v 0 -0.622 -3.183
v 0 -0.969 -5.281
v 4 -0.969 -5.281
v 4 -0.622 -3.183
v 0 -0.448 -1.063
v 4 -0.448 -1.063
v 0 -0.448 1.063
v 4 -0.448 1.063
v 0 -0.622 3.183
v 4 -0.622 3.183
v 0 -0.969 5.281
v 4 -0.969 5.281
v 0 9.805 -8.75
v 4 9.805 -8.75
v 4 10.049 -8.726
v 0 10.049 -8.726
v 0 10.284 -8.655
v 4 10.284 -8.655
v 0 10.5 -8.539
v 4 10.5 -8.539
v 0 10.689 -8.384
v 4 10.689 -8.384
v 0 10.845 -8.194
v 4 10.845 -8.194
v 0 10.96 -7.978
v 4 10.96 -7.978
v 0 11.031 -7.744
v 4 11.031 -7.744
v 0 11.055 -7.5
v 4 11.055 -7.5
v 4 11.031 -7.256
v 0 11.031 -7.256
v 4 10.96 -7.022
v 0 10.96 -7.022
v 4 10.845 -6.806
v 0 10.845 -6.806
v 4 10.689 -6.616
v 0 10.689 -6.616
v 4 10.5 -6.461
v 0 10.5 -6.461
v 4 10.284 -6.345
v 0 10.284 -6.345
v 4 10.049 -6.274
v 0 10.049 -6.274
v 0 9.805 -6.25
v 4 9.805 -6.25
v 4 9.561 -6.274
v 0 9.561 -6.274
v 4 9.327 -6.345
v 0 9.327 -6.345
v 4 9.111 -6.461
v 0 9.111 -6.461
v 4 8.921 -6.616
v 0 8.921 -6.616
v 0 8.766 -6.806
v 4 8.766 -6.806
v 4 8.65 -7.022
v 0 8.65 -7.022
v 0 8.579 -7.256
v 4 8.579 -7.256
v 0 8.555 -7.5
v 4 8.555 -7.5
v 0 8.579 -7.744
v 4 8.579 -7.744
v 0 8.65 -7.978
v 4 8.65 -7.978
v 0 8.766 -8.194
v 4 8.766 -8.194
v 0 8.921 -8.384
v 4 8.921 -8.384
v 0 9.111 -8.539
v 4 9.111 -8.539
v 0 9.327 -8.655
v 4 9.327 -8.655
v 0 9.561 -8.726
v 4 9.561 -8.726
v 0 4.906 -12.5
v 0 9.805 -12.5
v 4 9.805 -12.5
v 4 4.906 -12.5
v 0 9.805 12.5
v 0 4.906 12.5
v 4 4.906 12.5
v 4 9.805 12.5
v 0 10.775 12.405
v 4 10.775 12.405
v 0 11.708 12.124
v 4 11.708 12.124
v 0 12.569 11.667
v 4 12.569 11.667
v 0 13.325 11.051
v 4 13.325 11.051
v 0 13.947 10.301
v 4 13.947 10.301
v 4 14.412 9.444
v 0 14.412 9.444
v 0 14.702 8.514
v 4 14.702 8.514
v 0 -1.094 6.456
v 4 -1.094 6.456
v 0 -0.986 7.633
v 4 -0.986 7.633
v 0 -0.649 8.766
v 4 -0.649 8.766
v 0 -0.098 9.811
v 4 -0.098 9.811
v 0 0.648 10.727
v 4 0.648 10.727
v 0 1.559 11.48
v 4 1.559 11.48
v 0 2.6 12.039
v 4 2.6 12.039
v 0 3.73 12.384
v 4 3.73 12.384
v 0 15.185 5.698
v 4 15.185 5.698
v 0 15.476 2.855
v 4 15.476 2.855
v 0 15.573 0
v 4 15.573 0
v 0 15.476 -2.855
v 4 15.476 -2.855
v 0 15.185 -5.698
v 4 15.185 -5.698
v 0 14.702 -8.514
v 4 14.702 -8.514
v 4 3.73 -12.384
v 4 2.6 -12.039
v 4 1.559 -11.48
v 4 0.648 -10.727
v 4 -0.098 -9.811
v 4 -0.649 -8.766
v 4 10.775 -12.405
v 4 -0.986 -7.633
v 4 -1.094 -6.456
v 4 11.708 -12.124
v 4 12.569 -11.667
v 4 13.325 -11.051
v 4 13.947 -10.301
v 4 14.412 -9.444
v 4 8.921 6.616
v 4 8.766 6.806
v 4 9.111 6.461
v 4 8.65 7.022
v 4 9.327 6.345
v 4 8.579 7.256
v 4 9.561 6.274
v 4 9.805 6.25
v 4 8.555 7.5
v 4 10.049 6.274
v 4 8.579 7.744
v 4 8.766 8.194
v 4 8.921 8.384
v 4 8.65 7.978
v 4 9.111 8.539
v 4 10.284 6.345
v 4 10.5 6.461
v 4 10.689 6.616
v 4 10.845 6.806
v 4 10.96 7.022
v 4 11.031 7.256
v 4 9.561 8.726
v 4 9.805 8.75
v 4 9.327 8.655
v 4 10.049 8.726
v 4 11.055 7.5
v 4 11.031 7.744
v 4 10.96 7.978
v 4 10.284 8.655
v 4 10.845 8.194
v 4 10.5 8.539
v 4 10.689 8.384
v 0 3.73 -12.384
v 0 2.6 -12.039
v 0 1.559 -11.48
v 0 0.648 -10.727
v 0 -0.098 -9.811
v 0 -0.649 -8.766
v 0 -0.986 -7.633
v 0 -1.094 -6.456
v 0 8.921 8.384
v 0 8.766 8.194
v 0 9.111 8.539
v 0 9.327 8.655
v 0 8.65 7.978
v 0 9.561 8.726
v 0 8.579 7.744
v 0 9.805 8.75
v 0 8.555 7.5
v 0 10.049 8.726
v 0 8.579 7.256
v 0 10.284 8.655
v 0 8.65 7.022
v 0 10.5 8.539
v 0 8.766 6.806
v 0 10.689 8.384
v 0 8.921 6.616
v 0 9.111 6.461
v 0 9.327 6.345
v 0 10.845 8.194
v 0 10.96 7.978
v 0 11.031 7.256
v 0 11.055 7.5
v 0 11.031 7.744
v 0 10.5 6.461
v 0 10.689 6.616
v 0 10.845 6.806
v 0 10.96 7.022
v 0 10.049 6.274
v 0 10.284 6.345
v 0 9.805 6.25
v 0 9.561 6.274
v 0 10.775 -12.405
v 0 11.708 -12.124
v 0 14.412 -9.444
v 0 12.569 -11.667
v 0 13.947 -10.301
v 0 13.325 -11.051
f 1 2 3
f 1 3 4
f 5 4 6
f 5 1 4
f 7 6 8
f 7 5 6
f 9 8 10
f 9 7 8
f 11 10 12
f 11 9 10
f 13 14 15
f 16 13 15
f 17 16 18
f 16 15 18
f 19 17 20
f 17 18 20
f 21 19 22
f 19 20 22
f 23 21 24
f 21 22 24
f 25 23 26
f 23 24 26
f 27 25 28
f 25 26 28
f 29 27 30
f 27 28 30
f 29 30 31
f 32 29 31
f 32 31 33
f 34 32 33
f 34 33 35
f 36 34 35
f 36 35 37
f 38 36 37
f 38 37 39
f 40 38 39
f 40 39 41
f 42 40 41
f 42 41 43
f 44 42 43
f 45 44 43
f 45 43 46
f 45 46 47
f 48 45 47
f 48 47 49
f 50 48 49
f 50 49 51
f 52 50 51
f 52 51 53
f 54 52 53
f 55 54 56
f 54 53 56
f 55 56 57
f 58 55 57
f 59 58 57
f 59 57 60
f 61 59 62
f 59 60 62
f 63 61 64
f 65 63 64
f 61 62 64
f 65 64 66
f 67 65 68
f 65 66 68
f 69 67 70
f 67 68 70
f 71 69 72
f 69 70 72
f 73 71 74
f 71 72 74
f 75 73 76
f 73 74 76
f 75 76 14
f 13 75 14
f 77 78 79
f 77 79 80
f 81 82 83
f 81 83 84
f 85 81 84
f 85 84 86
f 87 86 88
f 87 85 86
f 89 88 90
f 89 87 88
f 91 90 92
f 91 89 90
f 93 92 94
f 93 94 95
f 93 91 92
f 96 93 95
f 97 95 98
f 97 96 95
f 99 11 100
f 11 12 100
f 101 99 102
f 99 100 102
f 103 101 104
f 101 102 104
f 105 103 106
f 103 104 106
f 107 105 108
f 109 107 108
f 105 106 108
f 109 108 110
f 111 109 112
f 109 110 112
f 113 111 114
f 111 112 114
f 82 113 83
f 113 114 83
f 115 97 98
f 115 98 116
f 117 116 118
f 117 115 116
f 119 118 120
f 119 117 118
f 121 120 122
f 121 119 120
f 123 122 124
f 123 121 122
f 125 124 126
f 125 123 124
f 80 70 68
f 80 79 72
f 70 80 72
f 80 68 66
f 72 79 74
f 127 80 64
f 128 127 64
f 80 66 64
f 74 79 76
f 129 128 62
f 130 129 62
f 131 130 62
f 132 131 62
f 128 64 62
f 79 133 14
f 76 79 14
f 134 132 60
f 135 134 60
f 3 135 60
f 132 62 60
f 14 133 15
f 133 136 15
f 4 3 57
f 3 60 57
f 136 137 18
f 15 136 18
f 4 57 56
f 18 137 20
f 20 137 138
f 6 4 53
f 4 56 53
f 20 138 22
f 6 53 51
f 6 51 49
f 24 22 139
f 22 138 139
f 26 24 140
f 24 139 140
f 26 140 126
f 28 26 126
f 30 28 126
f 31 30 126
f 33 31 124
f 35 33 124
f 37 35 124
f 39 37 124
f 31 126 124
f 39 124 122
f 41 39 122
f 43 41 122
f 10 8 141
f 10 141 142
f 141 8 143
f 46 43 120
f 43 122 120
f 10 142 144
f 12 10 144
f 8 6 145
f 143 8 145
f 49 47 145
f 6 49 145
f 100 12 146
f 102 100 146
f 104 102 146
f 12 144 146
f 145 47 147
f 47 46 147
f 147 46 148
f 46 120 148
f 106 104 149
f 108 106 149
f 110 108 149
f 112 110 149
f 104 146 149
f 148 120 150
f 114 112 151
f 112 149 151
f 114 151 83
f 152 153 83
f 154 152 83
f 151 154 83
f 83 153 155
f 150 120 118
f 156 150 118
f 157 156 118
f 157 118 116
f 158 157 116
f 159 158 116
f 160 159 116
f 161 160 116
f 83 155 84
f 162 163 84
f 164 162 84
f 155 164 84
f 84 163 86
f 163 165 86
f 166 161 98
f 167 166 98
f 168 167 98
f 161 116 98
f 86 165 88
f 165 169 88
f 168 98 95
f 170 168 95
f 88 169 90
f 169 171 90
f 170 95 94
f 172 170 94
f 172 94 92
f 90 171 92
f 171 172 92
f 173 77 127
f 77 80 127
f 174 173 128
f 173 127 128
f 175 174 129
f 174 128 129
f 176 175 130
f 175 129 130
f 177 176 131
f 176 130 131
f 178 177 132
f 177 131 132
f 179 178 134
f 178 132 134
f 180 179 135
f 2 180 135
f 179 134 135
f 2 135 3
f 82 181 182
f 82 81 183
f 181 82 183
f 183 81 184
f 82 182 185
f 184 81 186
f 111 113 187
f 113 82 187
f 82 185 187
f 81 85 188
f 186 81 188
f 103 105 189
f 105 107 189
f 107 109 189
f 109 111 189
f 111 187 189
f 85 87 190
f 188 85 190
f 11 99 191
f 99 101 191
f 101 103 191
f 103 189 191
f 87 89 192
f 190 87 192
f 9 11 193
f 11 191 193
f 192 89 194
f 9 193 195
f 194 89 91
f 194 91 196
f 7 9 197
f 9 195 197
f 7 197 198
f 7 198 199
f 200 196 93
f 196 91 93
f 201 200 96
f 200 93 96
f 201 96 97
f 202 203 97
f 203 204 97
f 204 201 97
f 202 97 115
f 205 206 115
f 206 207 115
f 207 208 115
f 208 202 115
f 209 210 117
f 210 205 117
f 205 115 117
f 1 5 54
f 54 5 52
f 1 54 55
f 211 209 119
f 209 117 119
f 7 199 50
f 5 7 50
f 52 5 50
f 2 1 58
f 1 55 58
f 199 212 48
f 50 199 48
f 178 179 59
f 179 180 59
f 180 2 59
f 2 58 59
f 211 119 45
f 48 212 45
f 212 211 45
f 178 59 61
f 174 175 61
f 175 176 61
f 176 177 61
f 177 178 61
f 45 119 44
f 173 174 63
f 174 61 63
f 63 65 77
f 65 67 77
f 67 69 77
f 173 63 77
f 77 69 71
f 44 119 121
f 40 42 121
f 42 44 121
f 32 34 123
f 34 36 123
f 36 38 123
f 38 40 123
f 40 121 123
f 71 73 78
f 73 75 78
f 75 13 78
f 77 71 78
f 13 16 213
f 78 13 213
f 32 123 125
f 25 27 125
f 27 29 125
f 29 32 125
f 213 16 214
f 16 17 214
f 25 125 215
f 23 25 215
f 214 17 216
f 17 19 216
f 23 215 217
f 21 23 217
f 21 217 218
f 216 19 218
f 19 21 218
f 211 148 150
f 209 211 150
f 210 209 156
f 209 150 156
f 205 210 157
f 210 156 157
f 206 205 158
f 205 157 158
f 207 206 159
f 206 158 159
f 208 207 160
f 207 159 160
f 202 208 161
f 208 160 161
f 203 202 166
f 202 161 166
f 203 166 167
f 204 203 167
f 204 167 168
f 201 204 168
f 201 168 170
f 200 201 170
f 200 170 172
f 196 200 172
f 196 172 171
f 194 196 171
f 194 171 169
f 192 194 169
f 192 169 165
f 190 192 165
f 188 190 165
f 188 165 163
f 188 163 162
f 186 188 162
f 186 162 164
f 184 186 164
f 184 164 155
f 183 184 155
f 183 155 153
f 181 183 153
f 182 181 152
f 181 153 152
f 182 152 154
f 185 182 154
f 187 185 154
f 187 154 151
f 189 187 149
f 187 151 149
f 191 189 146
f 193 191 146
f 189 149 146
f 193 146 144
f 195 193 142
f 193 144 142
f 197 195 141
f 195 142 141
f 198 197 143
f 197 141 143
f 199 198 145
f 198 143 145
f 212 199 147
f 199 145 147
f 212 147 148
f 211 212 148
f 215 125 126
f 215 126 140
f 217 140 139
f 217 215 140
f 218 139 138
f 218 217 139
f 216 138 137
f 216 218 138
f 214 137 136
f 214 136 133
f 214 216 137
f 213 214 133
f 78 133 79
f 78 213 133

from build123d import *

# Parameters (mm, degrees)
SKETCH2_R             = 3
BOSS_EXTRUDE1_DEPTH   = 4
FILLET1_R             = 6
M3X0_5_TAPPED_HOLE1_D = 2.5


with BuildPart() as part:
    # Sketch2 → Boss-Extrude1 (new body)
    # profile 1 of 2: a face of its own
    with BuildSketch(Plane(origin=(0, 0, 0), x_dir=(0, 0, -1), z_dir=(1, 0, 0))):
        with BuildLine():
            Line((12.5, 9.80532533), (12.5, -3.628540469))
            ThreePointArc((12.5, -3.628540469), (0, -0.426566699), (-12.5, -3.628540469))
            Line((-12.5, -3.628540469), (-12.5, 9.80532533))
            ThreePointArc((-12.5, 9.80532533), (-11.377342361, 12.962256786), (-8.513513514, 14.701526956))
            ThreePointArc((-8.513513514, 14.701526956), (0, 15.573433301), (8.513513514, 14.701526956))
            ThreePointArc((8.513513514, 14.701526956), (11.377342361, 12.962256786), (12.5, 9.80532533))
        make_face()
        with Locations((0, 10.573433301)):
            Circle(SKETCH2_R, mode=Mode.SUBTRACT)
    # profile 2 of 2: a face of its own
    with BuildSketch(Plane(origin=(0, 0, 0), x_dir=(0, 0, -1), z_dir=(1, 0, 0))):
        with Locations((0, 10.573433301)):
            Circle(SKETCH2_R)
    extrude(amount=BOSS_EXTRUDE1_DEPTH)

    # Fillet1
    fillet1_edges = [part.edges().sort_by_distance(p)[0] for p in [
        (2, -3.628540469, -12.5),
        (2, -3.628540469, 12.5),
    ]]
    fillet(fillet1_edges, radius=FILLET1_R)

    # M3x0.5 Tapped Hole1 (through all)
    with Locations(Plane.ZY):
        with Locations((-7.5, 9.80532533), (7.5, 9.80532533)):
            Hole(M3X0_5_TAPPED_HOLE1_D / 2)


solid = part.part
